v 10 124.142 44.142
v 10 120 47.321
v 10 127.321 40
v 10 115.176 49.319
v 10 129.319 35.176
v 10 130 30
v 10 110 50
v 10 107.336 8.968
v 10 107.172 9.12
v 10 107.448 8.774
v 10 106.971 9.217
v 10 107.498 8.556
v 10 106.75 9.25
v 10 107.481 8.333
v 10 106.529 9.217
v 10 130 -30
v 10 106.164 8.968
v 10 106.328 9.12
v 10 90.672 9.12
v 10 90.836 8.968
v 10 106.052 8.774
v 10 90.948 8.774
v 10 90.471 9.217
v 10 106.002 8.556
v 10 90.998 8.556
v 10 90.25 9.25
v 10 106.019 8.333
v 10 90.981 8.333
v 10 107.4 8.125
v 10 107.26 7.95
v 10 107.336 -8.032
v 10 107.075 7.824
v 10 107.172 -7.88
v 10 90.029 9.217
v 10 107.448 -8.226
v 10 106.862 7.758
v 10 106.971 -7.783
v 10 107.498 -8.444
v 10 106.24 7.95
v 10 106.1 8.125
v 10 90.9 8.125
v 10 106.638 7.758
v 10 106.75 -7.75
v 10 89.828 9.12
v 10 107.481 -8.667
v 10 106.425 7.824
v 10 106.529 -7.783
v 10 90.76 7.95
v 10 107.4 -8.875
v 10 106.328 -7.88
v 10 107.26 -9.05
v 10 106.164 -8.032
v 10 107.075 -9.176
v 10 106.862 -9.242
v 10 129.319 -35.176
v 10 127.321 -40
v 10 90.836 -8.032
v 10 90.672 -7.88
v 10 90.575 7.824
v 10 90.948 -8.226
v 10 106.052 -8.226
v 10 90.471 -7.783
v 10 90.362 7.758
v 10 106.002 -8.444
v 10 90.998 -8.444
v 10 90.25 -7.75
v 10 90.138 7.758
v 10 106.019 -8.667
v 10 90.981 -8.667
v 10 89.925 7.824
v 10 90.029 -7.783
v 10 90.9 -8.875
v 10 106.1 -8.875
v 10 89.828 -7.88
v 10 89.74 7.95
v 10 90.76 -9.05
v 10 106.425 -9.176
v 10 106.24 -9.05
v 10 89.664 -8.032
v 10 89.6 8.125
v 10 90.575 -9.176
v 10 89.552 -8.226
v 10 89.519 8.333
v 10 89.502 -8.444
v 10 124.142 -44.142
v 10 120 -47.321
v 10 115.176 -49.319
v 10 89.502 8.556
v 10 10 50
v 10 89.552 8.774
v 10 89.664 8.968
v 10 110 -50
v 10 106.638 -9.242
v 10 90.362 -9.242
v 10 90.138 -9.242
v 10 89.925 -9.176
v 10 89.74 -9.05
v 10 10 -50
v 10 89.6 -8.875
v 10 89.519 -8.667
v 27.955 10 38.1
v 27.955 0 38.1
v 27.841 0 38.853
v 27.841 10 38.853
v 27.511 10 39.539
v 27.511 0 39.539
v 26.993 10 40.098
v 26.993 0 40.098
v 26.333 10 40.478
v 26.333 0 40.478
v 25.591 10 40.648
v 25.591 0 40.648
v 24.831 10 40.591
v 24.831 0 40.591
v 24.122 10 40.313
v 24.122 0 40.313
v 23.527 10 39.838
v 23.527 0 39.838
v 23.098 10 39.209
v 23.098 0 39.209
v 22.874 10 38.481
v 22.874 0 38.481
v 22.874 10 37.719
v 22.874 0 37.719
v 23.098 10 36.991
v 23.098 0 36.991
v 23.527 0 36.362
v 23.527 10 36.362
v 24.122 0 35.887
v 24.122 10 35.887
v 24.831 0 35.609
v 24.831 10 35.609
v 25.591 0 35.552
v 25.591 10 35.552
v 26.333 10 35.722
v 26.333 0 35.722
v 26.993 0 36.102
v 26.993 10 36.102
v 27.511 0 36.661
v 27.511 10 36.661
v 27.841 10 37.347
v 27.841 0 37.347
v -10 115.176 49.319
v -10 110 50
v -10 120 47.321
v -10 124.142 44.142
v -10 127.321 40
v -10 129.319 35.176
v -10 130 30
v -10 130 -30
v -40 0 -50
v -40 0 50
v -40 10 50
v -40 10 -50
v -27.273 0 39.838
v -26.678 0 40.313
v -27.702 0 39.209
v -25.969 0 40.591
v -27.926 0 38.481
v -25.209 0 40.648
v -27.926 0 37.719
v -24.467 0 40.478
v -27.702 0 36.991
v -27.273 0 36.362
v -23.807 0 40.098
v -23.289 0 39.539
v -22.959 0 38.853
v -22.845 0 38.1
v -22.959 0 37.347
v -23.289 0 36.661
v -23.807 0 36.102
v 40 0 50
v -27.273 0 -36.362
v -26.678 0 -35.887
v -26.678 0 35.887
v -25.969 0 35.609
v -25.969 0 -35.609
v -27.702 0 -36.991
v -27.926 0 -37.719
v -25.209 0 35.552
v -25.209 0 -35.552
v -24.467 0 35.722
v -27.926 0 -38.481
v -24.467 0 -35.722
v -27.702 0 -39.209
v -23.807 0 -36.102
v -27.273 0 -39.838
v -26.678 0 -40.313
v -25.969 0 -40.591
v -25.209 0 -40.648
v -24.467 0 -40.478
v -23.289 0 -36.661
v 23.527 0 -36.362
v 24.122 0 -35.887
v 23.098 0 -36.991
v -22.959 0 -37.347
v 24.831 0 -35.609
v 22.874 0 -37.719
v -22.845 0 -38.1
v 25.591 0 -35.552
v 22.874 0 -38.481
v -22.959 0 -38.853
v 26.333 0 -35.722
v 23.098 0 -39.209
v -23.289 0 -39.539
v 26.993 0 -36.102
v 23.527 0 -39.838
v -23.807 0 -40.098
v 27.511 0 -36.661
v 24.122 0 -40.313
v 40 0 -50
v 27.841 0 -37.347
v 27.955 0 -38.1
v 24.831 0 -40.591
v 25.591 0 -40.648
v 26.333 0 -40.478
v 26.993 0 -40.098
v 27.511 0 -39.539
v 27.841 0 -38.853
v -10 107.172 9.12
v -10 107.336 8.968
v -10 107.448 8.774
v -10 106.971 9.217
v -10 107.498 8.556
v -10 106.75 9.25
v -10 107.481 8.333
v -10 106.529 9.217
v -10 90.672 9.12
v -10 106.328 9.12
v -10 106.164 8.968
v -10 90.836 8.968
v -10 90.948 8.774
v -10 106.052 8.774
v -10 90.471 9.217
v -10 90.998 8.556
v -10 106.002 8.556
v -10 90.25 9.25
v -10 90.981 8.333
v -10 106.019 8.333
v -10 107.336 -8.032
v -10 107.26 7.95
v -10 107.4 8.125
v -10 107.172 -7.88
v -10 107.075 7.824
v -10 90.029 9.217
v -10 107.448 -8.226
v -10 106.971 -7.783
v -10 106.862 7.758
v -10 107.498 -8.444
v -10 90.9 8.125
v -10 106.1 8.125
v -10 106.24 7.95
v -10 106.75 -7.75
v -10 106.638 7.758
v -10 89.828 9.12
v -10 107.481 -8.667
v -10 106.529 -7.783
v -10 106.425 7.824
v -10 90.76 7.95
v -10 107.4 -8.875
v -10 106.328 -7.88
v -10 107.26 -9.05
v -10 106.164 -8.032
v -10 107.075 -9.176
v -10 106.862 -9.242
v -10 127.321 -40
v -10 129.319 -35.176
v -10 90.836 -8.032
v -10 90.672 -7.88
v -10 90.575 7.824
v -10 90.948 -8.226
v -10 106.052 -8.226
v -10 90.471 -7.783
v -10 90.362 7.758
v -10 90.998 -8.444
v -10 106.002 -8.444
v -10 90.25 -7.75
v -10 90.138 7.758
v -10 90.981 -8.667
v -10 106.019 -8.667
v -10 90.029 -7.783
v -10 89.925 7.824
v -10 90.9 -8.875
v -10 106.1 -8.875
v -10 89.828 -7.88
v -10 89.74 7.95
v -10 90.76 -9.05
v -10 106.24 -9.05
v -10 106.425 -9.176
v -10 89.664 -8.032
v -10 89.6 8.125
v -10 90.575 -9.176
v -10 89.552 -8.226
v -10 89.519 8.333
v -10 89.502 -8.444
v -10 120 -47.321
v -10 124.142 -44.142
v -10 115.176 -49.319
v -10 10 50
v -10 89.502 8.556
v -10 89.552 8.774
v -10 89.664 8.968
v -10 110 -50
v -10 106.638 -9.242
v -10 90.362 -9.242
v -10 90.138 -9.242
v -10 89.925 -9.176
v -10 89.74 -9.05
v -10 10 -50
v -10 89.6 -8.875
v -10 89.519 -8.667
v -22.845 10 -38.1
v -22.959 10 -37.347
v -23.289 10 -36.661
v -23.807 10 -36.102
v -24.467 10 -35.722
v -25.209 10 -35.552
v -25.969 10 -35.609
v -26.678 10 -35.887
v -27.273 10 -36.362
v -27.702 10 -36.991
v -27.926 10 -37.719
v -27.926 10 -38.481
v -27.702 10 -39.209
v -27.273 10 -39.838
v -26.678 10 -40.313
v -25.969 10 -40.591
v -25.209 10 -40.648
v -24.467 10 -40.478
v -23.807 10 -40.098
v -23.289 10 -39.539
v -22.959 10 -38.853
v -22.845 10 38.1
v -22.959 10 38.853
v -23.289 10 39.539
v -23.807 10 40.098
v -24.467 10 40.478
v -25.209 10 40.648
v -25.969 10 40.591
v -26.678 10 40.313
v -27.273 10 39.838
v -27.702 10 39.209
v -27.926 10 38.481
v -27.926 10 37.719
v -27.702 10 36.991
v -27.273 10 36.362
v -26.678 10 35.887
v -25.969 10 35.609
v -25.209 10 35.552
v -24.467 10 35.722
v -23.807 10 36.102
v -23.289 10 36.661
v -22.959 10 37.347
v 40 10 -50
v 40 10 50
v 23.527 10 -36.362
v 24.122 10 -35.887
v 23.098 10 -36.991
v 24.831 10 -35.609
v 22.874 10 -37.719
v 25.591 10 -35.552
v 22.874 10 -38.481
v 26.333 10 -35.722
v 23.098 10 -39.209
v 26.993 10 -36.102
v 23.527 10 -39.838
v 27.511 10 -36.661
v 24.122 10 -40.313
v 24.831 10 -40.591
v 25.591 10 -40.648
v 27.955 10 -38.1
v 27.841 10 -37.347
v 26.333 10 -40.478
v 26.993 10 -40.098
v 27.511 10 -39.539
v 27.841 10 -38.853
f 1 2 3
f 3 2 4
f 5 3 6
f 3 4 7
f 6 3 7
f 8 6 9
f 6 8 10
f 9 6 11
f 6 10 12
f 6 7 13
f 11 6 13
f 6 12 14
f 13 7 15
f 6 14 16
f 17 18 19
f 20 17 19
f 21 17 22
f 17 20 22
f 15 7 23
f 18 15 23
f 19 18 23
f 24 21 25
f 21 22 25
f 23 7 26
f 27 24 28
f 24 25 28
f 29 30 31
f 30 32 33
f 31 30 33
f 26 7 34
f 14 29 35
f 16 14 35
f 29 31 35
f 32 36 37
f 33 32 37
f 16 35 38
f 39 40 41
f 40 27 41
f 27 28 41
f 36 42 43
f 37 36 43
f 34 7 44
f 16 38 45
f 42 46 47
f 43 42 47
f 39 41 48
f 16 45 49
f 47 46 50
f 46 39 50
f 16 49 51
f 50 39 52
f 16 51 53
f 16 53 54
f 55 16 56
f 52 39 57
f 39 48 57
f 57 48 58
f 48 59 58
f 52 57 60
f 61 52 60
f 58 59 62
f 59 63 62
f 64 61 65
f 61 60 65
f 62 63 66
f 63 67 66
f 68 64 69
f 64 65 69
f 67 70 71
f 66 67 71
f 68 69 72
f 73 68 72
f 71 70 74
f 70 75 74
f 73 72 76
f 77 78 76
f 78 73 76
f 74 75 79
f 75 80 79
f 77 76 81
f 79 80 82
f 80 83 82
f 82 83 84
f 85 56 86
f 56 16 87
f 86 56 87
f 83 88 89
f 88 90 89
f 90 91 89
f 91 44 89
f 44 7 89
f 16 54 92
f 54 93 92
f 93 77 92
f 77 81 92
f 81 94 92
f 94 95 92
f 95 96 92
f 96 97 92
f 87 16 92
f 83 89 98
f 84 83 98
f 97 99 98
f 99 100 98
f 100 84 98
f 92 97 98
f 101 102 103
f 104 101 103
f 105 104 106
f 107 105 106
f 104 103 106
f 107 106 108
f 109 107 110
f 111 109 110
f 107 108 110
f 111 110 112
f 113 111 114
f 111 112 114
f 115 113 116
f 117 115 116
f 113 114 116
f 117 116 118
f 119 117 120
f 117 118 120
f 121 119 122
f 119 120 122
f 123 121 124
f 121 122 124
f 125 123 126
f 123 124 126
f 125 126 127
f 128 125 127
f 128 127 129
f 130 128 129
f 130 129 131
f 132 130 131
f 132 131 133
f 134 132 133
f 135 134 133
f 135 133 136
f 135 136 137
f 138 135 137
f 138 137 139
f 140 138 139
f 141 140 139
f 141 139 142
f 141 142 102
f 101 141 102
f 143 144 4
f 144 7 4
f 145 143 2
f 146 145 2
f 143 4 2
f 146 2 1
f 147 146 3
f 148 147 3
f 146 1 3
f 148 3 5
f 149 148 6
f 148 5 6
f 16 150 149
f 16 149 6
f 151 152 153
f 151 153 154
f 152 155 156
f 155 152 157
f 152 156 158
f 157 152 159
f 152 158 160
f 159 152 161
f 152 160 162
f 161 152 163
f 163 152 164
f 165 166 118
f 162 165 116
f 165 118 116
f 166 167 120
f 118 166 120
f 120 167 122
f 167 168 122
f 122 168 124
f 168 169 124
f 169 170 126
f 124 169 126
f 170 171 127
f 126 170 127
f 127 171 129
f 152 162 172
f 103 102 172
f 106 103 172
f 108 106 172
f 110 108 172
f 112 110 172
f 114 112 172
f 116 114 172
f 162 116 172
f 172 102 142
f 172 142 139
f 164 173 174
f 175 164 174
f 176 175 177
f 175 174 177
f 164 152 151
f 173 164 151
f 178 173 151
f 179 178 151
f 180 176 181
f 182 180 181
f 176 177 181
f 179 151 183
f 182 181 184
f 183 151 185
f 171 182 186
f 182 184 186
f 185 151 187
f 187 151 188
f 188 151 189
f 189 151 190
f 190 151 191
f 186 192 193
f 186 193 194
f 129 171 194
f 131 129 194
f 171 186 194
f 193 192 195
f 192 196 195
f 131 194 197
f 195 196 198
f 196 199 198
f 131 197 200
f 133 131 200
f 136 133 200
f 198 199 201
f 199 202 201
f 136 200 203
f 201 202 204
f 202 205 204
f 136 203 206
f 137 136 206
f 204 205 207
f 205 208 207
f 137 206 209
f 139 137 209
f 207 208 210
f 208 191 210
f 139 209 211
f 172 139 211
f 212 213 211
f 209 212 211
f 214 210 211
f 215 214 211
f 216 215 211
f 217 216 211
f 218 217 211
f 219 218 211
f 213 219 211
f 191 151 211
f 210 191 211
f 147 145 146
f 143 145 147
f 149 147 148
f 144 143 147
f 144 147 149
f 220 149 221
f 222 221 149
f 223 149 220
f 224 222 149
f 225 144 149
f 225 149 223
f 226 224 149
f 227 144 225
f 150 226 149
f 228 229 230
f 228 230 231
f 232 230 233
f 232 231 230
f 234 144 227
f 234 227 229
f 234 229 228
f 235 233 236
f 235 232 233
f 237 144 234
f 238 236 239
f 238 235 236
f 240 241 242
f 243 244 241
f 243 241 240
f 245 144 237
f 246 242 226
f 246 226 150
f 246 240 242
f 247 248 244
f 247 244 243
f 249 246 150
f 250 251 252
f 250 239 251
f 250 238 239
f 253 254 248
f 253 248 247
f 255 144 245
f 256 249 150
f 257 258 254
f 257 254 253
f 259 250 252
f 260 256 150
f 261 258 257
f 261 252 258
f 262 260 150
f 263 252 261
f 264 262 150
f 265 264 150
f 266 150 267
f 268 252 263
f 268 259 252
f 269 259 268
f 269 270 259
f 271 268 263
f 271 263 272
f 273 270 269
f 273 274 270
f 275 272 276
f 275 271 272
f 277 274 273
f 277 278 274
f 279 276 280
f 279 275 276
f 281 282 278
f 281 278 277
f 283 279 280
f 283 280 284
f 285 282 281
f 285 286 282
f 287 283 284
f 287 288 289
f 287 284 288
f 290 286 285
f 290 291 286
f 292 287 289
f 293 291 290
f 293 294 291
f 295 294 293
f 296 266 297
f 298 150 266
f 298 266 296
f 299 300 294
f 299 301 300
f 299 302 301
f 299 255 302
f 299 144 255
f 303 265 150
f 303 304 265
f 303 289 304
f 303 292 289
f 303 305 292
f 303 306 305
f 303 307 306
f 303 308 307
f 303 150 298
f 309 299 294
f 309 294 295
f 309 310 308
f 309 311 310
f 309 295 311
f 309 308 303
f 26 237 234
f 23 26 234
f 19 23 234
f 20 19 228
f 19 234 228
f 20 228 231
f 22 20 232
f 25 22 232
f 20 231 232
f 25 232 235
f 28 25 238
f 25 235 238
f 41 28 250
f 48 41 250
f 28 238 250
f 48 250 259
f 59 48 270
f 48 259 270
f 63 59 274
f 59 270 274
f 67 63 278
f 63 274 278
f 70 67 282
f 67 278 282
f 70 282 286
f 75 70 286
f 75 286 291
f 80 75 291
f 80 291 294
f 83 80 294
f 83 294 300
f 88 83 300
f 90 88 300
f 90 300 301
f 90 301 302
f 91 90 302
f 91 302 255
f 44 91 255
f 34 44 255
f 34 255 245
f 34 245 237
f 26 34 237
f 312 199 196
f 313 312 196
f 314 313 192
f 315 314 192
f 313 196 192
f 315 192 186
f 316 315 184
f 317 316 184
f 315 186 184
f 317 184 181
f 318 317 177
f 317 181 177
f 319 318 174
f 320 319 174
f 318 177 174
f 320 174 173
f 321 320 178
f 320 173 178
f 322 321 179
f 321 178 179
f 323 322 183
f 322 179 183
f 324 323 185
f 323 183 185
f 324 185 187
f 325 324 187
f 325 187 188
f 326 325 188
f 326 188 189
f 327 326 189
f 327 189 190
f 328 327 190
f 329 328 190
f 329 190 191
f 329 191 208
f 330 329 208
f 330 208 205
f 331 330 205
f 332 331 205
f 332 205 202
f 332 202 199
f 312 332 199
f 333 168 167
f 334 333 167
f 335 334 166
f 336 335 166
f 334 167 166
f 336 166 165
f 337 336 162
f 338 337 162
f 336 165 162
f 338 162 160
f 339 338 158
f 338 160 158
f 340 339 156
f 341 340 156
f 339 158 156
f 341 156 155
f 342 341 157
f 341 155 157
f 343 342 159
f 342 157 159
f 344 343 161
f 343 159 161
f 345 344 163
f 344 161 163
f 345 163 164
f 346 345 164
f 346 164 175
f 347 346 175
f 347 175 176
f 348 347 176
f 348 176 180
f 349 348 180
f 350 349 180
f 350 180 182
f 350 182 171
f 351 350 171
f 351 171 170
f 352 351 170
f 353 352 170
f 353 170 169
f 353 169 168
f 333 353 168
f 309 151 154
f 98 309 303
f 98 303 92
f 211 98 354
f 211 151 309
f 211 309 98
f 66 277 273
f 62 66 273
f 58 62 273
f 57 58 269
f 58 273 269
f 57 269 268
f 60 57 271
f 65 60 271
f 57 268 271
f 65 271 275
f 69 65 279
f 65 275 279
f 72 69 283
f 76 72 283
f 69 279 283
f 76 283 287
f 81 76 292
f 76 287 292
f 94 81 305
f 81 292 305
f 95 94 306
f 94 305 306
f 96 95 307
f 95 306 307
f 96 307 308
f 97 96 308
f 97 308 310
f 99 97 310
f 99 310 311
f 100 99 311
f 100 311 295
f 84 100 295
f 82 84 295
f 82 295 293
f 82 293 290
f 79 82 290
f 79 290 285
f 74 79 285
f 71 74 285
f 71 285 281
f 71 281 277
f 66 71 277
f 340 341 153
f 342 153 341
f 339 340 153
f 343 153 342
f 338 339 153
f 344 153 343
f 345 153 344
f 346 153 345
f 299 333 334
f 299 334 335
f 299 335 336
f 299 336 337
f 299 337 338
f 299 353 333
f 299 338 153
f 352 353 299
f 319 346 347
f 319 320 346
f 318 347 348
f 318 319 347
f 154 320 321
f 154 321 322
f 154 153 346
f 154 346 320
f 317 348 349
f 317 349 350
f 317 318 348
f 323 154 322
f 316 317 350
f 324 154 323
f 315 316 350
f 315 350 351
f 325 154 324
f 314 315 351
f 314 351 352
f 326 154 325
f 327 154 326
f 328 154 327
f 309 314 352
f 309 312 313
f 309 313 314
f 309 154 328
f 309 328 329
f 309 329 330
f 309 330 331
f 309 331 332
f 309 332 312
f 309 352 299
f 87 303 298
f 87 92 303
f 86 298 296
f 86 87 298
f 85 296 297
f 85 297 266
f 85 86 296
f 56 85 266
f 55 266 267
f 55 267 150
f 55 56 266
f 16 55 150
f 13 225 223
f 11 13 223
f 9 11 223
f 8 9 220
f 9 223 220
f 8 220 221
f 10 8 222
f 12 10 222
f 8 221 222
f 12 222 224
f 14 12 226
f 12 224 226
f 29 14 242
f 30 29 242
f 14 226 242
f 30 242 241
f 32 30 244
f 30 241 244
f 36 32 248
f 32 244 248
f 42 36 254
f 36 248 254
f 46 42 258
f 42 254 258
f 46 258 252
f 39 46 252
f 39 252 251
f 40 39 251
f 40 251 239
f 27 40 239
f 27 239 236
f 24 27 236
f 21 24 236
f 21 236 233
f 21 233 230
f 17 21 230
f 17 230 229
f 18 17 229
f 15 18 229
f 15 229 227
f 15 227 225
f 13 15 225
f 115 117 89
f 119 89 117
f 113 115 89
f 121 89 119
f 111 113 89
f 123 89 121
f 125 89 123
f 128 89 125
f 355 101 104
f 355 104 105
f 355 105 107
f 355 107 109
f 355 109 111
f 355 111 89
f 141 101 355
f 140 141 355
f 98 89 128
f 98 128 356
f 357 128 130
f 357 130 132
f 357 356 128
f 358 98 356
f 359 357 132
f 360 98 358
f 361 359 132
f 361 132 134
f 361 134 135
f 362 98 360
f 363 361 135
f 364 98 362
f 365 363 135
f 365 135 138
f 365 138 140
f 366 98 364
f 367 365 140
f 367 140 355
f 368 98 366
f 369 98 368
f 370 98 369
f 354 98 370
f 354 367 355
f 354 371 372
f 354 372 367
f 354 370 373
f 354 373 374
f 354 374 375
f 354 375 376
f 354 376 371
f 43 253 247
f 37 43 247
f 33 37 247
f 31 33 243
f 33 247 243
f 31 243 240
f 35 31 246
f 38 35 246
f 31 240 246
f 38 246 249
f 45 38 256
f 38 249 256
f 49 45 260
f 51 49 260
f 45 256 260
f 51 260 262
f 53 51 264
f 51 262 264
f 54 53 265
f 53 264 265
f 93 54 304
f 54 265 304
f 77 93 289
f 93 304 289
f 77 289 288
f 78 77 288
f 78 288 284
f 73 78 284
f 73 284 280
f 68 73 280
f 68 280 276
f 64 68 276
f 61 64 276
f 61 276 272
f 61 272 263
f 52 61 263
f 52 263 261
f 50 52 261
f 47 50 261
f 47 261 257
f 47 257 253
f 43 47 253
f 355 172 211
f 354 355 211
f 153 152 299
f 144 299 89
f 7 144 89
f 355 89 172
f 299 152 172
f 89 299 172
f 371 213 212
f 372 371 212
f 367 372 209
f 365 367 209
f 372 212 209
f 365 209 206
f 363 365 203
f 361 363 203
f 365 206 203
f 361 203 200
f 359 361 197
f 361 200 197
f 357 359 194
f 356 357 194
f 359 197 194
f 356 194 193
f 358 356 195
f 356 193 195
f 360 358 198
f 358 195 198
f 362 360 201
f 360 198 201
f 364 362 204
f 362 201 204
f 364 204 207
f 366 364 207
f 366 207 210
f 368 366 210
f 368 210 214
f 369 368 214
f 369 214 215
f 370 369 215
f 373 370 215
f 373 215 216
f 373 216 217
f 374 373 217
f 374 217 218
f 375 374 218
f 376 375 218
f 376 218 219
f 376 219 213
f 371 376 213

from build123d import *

# Parameters (mm, degrees)
SKETCH2_W           = 80
SKETCH2_H           = 100
BOSS_EXTRUDE1_DEPTH = 10
SKETCH3_W           = 20
SKETCH3_H           = 100
BOSS_EXTRUDE2_DEPTH = 120
SKETCH5_R           = 2.555
CUT_EXTRUDE2_DEPTH  = 55
FILLET2_R           = 20
SKETCH4_R           = 0.75
CUT_EXTRUDE3_DEPTH  = 51


with BuildPart() as part:
    # Sketch2 → Boss-Extrude1 (new body)
    with BuildSketch(Plane(origin=(0, 0, 0), x_dir=(1, 0, 0), z_dir=(0, 1, 0))):
        Rectangle(SKETCH2_W, SKETCH2_H)
    extrude(amount=BOSS_EXTRUDE1_DEPTH)

    # Sketch3 → Boss-Extrude2 (add)
    with BuildSketch(Plane(origin=(0, 10, 0), x_dir=(1, 0, 0), z_dir=(0, 1, 0))):
        Rectangle(SKETCH3_W, SKETCH3_H)
    extrude(amount=BOSS_EXTRUDE2_DEPTH)

    # Sketch5 → Cut-Extrude2 (cut)
    with BuildSketch(Plane.XZ):
        with Locations((-25.4, -38.1)):
            Circle(SKETCH5_R)
        with Locations((25.4, -38.1)):
            Circle(SKETCH5_R)
        with Locations((-25.4, 38.1)):
            Circle(SKETCH5_R)
        with Locations((25.4, 38.1)):
            Circle(SKETCH5_R)
    extrude(amount=-CUT_EXTRUDE2_DEPTH, mode=Mode.SUBTRACT)

    # Fillet2
    fillet2_edges = [part.edges().sort_by_distance(p)[0] for p in [
        (0, 130, -50),
        (0, 130, 50),
    ]]
    fillet(fillet2_edges, radius=FILLET2_R)

    # Sketch4 → Cut-Extrude3 (cut, through all)
    with BuildSketch(Plane.ZY.offset(10)):
        with Locations((-8.5, 106.75)):
            Circle(SKETCH4_R)
        with Locations((-8.5, 90.25)):
            Circle(SKETCH4_R)
        with Locations((8.5, 90.25)):
            Circle(SKETCH4_R)
        with Locations((8.5, 106.75)):
            Circle(SKETCH4_R)
    extrude(amount=-CUT_EXTRUDE3_DEPTH, mode=Mode.SUBTRACT)


solid = part.part
